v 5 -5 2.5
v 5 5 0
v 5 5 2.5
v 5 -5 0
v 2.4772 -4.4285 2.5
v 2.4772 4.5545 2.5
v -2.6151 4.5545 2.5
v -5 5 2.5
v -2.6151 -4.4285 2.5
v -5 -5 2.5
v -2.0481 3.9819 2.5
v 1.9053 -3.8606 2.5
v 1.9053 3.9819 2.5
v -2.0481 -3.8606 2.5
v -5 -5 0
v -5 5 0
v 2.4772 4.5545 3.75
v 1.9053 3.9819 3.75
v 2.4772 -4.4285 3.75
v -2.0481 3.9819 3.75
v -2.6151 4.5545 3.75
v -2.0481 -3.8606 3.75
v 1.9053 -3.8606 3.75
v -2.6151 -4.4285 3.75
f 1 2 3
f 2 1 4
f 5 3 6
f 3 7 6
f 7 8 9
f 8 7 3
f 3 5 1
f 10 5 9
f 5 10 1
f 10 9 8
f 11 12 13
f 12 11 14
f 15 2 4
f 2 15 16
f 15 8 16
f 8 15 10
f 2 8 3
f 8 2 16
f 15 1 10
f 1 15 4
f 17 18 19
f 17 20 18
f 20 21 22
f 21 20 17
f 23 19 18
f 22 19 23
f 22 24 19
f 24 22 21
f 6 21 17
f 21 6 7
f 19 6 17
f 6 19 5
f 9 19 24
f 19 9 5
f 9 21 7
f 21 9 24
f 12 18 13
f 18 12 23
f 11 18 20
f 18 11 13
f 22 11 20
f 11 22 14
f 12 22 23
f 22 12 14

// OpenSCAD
character = "\u9F98";   //accepts standard openscad input
blockSize = 10;
blockFont = "SimSun";   //must be font on computer
for (i=[0:len(character)-1]){ 
    printingBlock(substr(character,i,1), size=blockSize, index=i);
}
module printingBlock(char, size=30, index) {
    translate([size*1.1*index, 0, 0]){
        union() {
            translate([0,0,size/8]) cube([size,size,size/4], center=true);
            
            translate([0,0,size*3/8]) {
                rotate([0,180,0]){
                linear_extrude(height=size/4, convexity=4)
                    text(char, 
                         size=size*22/30,
                         font=blockFont,
                         halign="center",
                         valign="center");
                }
            }
        }
    }
}
function substr(data, i, length=0) = (length == 0) ? _substr(data, i, len(data)) : _substr(data, i, length+i);
function _substr(str, i, j, out="") = (i==j) ? out : str(str[i], _substr(str, i+1, j, out));
$fn=250;
